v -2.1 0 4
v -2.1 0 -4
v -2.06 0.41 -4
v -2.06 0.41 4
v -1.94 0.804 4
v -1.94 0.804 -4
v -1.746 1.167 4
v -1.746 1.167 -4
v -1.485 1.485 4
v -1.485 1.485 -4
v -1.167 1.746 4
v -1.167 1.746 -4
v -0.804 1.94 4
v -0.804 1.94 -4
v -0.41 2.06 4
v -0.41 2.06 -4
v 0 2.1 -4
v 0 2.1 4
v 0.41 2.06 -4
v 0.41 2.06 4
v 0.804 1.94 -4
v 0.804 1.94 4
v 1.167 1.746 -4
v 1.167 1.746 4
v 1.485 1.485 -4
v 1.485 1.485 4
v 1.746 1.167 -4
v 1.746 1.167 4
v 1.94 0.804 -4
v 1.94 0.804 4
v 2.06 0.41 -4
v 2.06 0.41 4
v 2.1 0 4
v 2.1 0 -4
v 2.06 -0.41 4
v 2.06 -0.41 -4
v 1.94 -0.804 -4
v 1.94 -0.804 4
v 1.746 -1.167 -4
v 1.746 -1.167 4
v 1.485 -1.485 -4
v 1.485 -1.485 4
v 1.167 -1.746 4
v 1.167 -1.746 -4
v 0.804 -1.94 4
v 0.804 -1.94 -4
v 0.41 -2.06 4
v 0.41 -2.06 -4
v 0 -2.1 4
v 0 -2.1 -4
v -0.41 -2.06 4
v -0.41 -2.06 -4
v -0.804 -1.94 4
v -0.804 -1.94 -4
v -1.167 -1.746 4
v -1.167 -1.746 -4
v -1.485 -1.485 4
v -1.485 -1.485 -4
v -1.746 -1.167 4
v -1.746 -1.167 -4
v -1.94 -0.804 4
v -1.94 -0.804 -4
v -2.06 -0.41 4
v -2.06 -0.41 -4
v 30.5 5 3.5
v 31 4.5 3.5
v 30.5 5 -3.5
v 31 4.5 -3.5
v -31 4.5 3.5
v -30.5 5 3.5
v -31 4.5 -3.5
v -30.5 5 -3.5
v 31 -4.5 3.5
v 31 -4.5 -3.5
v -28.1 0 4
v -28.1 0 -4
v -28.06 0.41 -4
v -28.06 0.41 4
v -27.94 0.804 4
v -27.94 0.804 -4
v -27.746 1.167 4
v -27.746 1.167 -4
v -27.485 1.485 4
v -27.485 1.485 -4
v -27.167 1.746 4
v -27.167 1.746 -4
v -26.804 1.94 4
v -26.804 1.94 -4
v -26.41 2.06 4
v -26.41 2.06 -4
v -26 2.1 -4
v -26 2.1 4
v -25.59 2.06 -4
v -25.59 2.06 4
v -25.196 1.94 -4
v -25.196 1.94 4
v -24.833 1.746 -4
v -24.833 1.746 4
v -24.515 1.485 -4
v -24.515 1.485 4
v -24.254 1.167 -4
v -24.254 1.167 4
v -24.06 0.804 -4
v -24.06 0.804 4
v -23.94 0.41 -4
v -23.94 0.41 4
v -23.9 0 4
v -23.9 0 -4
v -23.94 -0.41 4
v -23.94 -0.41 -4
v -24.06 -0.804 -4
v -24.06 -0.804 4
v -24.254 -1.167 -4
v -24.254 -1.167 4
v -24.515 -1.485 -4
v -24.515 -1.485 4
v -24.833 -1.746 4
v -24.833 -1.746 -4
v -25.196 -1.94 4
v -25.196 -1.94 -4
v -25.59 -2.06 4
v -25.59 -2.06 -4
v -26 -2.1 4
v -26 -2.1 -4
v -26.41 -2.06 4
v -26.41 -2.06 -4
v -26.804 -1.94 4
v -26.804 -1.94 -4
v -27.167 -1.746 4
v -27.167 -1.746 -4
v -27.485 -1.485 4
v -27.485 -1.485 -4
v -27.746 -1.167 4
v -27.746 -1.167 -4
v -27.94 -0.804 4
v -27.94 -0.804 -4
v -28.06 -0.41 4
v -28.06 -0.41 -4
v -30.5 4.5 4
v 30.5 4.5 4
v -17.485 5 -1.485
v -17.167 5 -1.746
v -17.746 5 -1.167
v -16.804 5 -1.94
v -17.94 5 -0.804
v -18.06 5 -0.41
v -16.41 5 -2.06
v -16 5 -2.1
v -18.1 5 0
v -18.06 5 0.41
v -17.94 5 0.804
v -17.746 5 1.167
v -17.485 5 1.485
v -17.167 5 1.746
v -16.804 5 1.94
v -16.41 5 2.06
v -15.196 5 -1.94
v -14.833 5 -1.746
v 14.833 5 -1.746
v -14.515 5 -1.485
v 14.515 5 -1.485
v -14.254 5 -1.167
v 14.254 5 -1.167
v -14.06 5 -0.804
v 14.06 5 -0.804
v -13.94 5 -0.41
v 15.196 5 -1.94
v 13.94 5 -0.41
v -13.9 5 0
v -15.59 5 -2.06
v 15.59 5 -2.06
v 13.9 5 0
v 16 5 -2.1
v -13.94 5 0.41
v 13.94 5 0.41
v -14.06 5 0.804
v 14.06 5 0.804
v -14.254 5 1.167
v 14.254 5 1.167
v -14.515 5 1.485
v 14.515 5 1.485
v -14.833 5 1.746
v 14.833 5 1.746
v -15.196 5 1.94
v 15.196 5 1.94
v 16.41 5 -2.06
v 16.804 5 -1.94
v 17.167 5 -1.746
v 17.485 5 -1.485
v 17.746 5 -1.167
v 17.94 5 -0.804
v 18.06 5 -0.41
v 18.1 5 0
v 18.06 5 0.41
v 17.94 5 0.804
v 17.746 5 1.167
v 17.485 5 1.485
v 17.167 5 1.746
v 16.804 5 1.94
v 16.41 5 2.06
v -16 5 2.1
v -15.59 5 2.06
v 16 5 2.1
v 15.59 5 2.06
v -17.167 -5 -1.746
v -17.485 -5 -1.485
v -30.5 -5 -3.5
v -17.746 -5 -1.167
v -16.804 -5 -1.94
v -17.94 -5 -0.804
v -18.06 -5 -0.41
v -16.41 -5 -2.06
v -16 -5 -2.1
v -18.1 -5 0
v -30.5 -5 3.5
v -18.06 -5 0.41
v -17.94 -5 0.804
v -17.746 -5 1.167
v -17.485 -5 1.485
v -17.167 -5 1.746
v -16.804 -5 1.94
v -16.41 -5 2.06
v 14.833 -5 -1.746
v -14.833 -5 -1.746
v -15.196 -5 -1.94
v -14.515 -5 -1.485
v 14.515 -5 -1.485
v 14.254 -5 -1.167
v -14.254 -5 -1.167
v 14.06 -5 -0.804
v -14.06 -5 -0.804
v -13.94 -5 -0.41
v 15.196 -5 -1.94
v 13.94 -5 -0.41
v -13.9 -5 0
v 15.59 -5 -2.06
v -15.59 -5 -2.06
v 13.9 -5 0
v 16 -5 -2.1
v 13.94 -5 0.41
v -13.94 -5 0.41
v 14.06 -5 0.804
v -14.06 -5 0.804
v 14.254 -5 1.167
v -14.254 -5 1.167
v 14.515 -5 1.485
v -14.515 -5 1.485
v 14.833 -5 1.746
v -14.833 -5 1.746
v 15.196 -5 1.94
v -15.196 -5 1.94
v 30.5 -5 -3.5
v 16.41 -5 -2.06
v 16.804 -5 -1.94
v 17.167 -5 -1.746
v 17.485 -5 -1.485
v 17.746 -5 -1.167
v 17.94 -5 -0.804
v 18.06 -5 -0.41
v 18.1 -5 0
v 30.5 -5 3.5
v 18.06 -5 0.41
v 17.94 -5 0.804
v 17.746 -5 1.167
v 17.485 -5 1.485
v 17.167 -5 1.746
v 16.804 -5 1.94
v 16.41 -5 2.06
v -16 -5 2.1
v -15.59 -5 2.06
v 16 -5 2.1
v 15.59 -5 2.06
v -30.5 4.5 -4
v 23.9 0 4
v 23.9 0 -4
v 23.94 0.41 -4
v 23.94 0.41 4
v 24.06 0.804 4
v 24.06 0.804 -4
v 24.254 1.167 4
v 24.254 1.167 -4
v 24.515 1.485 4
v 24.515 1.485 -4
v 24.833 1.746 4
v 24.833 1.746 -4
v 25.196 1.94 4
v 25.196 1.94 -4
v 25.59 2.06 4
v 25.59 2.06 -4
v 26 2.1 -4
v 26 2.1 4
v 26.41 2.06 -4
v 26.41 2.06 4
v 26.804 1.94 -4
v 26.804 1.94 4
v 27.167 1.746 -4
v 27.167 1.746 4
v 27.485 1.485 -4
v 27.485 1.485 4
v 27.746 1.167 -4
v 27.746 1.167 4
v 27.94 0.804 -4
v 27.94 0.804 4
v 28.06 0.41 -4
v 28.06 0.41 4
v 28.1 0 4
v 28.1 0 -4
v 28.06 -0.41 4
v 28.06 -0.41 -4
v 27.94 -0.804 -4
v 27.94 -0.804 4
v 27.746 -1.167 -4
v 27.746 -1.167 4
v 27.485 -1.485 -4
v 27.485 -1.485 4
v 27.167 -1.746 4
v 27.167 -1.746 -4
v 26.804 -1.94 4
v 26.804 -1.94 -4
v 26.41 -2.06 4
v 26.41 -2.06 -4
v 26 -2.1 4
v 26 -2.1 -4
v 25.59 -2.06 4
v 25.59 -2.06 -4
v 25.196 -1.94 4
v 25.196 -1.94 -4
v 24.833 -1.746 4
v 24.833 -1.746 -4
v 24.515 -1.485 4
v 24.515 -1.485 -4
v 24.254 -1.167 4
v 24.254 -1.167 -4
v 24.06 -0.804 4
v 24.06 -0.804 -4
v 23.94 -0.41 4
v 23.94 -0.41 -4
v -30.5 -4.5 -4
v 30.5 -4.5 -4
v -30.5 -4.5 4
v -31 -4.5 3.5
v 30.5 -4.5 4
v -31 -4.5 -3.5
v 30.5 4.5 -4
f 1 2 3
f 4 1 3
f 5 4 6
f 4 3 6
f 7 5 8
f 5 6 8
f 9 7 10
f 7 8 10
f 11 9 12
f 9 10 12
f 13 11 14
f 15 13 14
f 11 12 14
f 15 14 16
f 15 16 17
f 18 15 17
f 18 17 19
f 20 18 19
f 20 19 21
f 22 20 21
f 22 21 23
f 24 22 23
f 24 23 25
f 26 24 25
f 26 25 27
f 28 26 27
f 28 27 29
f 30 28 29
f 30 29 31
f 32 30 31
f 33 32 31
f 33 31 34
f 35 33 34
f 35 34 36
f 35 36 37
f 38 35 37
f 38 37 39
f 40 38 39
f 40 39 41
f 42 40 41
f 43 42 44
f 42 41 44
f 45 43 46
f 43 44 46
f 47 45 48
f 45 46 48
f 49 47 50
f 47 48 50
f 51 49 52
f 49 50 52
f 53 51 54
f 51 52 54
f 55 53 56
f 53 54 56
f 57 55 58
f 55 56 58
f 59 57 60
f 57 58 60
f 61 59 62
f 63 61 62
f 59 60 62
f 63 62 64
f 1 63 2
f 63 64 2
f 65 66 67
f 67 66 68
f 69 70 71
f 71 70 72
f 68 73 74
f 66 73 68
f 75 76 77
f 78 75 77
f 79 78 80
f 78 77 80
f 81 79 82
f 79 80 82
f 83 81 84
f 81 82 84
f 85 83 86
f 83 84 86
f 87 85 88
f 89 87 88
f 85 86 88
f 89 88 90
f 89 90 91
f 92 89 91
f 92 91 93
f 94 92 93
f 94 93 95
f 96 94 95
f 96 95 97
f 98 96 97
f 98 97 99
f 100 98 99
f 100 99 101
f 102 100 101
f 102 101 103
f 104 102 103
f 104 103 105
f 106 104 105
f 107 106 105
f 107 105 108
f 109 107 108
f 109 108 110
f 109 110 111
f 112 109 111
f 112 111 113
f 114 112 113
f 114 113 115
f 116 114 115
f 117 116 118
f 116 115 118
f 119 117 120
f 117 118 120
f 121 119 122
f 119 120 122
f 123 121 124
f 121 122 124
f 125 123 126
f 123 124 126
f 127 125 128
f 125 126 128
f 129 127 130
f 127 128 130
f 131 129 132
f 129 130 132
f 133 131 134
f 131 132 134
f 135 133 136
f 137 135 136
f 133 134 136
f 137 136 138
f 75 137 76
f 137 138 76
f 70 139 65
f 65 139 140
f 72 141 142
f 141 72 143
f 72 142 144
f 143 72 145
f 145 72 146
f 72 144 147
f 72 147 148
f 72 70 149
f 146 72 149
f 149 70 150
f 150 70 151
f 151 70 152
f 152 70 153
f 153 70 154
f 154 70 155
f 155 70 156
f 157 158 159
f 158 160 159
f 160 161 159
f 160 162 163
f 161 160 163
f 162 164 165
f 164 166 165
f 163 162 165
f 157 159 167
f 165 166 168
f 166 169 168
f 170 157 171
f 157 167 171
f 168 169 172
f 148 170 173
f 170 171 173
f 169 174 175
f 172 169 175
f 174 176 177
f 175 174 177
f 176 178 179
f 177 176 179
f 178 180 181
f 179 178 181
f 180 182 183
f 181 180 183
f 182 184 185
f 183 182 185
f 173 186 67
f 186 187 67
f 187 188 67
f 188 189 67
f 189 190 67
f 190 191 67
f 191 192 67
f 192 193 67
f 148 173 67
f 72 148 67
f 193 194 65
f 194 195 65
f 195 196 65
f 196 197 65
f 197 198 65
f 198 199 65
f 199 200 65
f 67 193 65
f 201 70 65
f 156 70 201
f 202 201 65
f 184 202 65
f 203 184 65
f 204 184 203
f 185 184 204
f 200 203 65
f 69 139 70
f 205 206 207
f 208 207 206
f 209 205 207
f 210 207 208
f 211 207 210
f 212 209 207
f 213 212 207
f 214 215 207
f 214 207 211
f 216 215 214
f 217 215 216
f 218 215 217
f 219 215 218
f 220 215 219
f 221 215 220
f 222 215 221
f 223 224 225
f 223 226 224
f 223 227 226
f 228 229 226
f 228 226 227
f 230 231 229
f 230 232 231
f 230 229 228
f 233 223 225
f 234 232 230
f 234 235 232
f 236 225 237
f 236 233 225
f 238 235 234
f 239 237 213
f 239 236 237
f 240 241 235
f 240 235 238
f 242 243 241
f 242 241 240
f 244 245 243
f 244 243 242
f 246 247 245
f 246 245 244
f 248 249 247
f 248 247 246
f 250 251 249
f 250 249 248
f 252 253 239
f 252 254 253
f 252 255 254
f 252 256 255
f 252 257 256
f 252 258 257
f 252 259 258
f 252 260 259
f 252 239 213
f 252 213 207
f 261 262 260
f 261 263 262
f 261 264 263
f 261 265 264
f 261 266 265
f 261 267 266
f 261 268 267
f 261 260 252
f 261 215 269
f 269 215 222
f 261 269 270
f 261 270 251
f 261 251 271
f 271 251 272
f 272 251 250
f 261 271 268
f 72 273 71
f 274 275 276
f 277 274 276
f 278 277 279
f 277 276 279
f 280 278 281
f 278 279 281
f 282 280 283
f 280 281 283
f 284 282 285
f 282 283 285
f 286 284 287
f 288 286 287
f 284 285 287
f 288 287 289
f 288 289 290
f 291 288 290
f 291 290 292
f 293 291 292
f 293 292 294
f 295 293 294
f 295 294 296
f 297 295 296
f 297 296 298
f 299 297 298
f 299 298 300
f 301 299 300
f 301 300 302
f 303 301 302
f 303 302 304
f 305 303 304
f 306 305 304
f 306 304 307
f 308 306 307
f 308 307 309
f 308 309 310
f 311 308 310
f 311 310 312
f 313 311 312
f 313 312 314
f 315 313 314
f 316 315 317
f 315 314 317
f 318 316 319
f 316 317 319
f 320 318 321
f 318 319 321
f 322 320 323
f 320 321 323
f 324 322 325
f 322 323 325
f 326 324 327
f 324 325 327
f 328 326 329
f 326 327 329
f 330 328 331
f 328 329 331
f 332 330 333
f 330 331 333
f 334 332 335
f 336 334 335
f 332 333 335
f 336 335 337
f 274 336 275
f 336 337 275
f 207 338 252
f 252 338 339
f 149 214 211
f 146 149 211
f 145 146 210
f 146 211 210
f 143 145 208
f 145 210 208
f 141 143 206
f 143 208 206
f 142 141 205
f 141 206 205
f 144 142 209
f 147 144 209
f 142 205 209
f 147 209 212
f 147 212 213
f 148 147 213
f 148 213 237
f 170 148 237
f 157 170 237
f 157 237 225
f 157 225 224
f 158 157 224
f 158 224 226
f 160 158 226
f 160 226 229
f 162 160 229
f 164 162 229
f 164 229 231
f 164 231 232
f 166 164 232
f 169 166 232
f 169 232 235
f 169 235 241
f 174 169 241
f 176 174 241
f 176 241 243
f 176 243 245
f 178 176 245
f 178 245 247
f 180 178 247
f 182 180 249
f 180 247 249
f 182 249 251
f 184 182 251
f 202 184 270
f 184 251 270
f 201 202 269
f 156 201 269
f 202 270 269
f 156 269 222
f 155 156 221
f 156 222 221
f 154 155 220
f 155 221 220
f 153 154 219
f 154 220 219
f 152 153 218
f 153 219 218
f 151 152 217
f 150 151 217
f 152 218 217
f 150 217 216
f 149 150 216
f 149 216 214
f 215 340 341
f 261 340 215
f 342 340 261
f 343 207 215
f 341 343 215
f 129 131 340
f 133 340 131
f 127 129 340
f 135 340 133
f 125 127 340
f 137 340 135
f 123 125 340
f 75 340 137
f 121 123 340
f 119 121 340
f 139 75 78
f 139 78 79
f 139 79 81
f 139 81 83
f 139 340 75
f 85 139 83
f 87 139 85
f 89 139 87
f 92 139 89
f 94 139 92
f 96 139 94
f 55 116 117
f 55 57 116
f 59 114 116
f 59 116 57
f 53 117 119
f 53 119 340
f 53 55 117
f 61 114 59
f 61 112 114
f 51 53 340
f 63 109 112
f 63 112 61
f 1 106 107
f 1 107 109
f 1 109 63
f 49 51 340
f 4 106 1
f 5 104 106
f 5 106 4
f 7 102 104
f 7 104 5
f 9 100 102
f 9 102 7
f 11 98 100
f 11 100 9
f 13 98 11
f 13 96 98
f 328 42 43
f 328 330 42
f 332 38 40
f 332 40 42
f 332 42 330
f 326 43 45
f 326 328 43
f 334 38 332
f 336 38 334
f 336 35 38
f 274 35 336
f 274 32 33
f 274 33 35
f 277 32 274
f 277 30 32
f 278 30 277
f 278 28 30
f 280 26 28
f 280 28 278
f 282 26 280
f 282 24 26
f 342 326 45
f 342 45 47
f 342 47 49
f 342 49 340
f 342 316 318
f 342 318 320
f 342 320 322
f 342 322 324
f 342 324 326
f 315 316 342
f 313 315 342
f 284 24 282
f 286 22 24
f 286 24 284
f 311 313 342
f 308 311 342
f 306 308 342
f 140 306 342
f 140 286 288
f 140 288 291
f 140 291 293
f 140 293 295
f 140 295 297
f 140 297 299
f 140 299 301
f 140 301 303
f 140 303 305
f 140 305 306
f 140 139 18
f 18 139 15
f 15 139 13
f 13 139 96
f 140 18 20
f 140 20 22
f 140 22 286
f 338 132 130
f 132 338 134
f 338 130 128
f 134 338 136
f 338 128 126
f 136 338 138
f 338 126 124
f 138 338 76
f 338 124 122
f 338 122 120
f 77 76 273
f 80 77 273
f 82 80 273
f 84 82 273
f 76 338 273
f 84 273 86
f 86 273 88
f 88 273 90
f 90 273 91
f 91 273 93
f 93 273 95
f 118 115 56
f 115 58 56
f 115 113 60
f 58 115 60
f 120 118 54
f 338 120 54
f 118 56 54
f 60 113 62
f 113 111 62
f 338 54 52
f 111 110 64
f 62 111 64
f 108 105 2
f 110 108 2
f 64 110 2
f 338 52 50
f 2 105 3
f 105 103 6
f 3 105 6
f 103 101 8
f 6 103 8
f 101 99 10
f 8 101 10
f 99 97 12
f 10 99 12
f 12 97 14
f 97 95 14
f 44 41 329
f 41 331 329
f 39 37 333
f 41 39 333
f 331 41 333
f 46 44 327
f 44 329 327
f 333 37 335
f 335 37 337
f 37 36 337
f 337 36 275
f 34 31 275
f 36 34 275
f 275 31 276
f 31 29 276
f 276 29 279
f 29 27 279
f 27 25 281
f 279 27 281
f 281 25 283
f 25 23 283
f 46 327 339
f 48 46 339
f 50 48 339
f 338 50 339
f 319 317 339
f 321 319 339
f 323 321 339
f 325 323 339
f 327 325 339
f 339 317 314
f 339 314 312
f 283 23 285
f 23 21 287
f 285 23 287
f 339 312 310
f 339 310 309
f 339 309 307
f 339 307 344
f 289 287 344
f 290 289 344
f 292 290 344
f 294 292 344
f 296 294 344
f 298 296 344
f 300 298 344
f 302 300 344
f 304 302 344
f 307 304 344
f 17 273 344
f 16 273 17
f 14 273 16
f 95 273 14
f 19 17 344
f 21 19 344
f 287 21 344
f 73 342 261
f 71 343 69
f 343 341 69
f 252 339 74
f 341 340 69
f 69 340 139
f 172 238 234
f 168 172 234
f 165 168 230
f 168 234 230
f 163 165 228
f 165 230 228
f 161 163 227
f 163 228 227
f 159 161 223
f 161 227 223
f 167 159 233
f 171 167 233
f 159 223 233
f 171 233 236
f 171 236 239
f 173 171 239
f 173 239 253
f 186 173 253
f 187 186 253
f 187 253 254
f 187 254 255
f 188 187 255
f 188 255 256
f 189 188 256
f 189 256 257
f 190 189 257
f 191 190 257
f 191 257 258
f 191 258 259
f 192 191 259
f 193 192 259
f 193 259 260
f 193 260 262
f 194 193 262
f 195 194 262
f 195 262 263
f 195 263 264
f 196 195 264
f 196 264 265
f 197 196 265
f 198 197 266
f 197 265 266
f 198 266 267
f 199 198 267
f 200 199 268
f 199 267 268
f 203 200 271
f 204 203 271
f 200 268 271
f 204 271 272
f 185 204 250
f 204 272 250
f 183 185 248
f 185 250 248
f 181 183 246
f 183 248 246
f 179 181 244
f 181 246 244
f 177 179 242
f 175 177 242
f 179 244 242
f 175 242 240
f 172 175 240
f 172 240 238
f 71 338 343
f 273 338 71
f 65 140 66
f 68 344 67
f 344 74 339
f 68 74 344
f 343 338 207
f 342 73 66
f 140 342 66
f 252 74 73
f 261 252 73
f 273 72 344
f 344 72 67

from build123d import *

# Parameters (mm, degrees)
SKETCH_2_W         = 62
SKETCH_2_H         = 10
SKETCH_2_R         = 0.5
EXTRUDE_1_DEPTH    = 4
HOLE_WIZARD_M5_1_D = 4.2
HOLE_WIZARD_M5_2_D = 4.2
CHAMFER_1_SIZE     = 0.5


with BuildPart() as part:
    # 草图2 → 凸台-拉伸1 (new, symmetric)
    with BuildSketch(Plane.XY):
        Rectangle(SKETCH_2_W, SKETCH_2_H)
        with Locations((-26, 0)):
            Circle(SKETCH_2_R, mode=Mode.SUBTRACT)
        with Locations((26, 0)):
            Circle(SKETCH_2_R, mode=Mode.SUBTRACT)
    extrude(amount=EXTRUDE_1_DEPTH, both=True)

    # M5 螺纹孔1 (through all)
    with Locations(Plane.XY.offset(4)):
        with Locations((0, 0), (-26, 0), (26, 0)):
            Hole(HOLE_WIZARD_M5_1_D / 2)

    # M5 螺纹孔2 (through all)
    with Locations(Plane(origin=(0, 5, 0), x_dir=(1, 0, 0), z_dir=(0, 1, 0))):
        with Locations((16, 0), (-16, 0)):
            Hole(HOLE_WIZARD_M5_2_D / 2)

    # 倒角1
    chamfer_1_edges = [part.edges().sort_by_distance(p)[0] for p in [
        (0, -5, 4),
        (31, 0, 4),
        (0, 5, 4),
        (31, 0, -4),
        (0, -5, -4),
        (-31, 0, -4),
        (0, 5, -4),
        (-31, 0, 4),
        (31, 5, 0),
        (31, -5, 0),
        (-31, -5, 0),
        (-31, 5, 0),
    ]]
    chamfer(chamfer_1_edges, length=CHAMFER_1_SIZE)


solid = part.part
